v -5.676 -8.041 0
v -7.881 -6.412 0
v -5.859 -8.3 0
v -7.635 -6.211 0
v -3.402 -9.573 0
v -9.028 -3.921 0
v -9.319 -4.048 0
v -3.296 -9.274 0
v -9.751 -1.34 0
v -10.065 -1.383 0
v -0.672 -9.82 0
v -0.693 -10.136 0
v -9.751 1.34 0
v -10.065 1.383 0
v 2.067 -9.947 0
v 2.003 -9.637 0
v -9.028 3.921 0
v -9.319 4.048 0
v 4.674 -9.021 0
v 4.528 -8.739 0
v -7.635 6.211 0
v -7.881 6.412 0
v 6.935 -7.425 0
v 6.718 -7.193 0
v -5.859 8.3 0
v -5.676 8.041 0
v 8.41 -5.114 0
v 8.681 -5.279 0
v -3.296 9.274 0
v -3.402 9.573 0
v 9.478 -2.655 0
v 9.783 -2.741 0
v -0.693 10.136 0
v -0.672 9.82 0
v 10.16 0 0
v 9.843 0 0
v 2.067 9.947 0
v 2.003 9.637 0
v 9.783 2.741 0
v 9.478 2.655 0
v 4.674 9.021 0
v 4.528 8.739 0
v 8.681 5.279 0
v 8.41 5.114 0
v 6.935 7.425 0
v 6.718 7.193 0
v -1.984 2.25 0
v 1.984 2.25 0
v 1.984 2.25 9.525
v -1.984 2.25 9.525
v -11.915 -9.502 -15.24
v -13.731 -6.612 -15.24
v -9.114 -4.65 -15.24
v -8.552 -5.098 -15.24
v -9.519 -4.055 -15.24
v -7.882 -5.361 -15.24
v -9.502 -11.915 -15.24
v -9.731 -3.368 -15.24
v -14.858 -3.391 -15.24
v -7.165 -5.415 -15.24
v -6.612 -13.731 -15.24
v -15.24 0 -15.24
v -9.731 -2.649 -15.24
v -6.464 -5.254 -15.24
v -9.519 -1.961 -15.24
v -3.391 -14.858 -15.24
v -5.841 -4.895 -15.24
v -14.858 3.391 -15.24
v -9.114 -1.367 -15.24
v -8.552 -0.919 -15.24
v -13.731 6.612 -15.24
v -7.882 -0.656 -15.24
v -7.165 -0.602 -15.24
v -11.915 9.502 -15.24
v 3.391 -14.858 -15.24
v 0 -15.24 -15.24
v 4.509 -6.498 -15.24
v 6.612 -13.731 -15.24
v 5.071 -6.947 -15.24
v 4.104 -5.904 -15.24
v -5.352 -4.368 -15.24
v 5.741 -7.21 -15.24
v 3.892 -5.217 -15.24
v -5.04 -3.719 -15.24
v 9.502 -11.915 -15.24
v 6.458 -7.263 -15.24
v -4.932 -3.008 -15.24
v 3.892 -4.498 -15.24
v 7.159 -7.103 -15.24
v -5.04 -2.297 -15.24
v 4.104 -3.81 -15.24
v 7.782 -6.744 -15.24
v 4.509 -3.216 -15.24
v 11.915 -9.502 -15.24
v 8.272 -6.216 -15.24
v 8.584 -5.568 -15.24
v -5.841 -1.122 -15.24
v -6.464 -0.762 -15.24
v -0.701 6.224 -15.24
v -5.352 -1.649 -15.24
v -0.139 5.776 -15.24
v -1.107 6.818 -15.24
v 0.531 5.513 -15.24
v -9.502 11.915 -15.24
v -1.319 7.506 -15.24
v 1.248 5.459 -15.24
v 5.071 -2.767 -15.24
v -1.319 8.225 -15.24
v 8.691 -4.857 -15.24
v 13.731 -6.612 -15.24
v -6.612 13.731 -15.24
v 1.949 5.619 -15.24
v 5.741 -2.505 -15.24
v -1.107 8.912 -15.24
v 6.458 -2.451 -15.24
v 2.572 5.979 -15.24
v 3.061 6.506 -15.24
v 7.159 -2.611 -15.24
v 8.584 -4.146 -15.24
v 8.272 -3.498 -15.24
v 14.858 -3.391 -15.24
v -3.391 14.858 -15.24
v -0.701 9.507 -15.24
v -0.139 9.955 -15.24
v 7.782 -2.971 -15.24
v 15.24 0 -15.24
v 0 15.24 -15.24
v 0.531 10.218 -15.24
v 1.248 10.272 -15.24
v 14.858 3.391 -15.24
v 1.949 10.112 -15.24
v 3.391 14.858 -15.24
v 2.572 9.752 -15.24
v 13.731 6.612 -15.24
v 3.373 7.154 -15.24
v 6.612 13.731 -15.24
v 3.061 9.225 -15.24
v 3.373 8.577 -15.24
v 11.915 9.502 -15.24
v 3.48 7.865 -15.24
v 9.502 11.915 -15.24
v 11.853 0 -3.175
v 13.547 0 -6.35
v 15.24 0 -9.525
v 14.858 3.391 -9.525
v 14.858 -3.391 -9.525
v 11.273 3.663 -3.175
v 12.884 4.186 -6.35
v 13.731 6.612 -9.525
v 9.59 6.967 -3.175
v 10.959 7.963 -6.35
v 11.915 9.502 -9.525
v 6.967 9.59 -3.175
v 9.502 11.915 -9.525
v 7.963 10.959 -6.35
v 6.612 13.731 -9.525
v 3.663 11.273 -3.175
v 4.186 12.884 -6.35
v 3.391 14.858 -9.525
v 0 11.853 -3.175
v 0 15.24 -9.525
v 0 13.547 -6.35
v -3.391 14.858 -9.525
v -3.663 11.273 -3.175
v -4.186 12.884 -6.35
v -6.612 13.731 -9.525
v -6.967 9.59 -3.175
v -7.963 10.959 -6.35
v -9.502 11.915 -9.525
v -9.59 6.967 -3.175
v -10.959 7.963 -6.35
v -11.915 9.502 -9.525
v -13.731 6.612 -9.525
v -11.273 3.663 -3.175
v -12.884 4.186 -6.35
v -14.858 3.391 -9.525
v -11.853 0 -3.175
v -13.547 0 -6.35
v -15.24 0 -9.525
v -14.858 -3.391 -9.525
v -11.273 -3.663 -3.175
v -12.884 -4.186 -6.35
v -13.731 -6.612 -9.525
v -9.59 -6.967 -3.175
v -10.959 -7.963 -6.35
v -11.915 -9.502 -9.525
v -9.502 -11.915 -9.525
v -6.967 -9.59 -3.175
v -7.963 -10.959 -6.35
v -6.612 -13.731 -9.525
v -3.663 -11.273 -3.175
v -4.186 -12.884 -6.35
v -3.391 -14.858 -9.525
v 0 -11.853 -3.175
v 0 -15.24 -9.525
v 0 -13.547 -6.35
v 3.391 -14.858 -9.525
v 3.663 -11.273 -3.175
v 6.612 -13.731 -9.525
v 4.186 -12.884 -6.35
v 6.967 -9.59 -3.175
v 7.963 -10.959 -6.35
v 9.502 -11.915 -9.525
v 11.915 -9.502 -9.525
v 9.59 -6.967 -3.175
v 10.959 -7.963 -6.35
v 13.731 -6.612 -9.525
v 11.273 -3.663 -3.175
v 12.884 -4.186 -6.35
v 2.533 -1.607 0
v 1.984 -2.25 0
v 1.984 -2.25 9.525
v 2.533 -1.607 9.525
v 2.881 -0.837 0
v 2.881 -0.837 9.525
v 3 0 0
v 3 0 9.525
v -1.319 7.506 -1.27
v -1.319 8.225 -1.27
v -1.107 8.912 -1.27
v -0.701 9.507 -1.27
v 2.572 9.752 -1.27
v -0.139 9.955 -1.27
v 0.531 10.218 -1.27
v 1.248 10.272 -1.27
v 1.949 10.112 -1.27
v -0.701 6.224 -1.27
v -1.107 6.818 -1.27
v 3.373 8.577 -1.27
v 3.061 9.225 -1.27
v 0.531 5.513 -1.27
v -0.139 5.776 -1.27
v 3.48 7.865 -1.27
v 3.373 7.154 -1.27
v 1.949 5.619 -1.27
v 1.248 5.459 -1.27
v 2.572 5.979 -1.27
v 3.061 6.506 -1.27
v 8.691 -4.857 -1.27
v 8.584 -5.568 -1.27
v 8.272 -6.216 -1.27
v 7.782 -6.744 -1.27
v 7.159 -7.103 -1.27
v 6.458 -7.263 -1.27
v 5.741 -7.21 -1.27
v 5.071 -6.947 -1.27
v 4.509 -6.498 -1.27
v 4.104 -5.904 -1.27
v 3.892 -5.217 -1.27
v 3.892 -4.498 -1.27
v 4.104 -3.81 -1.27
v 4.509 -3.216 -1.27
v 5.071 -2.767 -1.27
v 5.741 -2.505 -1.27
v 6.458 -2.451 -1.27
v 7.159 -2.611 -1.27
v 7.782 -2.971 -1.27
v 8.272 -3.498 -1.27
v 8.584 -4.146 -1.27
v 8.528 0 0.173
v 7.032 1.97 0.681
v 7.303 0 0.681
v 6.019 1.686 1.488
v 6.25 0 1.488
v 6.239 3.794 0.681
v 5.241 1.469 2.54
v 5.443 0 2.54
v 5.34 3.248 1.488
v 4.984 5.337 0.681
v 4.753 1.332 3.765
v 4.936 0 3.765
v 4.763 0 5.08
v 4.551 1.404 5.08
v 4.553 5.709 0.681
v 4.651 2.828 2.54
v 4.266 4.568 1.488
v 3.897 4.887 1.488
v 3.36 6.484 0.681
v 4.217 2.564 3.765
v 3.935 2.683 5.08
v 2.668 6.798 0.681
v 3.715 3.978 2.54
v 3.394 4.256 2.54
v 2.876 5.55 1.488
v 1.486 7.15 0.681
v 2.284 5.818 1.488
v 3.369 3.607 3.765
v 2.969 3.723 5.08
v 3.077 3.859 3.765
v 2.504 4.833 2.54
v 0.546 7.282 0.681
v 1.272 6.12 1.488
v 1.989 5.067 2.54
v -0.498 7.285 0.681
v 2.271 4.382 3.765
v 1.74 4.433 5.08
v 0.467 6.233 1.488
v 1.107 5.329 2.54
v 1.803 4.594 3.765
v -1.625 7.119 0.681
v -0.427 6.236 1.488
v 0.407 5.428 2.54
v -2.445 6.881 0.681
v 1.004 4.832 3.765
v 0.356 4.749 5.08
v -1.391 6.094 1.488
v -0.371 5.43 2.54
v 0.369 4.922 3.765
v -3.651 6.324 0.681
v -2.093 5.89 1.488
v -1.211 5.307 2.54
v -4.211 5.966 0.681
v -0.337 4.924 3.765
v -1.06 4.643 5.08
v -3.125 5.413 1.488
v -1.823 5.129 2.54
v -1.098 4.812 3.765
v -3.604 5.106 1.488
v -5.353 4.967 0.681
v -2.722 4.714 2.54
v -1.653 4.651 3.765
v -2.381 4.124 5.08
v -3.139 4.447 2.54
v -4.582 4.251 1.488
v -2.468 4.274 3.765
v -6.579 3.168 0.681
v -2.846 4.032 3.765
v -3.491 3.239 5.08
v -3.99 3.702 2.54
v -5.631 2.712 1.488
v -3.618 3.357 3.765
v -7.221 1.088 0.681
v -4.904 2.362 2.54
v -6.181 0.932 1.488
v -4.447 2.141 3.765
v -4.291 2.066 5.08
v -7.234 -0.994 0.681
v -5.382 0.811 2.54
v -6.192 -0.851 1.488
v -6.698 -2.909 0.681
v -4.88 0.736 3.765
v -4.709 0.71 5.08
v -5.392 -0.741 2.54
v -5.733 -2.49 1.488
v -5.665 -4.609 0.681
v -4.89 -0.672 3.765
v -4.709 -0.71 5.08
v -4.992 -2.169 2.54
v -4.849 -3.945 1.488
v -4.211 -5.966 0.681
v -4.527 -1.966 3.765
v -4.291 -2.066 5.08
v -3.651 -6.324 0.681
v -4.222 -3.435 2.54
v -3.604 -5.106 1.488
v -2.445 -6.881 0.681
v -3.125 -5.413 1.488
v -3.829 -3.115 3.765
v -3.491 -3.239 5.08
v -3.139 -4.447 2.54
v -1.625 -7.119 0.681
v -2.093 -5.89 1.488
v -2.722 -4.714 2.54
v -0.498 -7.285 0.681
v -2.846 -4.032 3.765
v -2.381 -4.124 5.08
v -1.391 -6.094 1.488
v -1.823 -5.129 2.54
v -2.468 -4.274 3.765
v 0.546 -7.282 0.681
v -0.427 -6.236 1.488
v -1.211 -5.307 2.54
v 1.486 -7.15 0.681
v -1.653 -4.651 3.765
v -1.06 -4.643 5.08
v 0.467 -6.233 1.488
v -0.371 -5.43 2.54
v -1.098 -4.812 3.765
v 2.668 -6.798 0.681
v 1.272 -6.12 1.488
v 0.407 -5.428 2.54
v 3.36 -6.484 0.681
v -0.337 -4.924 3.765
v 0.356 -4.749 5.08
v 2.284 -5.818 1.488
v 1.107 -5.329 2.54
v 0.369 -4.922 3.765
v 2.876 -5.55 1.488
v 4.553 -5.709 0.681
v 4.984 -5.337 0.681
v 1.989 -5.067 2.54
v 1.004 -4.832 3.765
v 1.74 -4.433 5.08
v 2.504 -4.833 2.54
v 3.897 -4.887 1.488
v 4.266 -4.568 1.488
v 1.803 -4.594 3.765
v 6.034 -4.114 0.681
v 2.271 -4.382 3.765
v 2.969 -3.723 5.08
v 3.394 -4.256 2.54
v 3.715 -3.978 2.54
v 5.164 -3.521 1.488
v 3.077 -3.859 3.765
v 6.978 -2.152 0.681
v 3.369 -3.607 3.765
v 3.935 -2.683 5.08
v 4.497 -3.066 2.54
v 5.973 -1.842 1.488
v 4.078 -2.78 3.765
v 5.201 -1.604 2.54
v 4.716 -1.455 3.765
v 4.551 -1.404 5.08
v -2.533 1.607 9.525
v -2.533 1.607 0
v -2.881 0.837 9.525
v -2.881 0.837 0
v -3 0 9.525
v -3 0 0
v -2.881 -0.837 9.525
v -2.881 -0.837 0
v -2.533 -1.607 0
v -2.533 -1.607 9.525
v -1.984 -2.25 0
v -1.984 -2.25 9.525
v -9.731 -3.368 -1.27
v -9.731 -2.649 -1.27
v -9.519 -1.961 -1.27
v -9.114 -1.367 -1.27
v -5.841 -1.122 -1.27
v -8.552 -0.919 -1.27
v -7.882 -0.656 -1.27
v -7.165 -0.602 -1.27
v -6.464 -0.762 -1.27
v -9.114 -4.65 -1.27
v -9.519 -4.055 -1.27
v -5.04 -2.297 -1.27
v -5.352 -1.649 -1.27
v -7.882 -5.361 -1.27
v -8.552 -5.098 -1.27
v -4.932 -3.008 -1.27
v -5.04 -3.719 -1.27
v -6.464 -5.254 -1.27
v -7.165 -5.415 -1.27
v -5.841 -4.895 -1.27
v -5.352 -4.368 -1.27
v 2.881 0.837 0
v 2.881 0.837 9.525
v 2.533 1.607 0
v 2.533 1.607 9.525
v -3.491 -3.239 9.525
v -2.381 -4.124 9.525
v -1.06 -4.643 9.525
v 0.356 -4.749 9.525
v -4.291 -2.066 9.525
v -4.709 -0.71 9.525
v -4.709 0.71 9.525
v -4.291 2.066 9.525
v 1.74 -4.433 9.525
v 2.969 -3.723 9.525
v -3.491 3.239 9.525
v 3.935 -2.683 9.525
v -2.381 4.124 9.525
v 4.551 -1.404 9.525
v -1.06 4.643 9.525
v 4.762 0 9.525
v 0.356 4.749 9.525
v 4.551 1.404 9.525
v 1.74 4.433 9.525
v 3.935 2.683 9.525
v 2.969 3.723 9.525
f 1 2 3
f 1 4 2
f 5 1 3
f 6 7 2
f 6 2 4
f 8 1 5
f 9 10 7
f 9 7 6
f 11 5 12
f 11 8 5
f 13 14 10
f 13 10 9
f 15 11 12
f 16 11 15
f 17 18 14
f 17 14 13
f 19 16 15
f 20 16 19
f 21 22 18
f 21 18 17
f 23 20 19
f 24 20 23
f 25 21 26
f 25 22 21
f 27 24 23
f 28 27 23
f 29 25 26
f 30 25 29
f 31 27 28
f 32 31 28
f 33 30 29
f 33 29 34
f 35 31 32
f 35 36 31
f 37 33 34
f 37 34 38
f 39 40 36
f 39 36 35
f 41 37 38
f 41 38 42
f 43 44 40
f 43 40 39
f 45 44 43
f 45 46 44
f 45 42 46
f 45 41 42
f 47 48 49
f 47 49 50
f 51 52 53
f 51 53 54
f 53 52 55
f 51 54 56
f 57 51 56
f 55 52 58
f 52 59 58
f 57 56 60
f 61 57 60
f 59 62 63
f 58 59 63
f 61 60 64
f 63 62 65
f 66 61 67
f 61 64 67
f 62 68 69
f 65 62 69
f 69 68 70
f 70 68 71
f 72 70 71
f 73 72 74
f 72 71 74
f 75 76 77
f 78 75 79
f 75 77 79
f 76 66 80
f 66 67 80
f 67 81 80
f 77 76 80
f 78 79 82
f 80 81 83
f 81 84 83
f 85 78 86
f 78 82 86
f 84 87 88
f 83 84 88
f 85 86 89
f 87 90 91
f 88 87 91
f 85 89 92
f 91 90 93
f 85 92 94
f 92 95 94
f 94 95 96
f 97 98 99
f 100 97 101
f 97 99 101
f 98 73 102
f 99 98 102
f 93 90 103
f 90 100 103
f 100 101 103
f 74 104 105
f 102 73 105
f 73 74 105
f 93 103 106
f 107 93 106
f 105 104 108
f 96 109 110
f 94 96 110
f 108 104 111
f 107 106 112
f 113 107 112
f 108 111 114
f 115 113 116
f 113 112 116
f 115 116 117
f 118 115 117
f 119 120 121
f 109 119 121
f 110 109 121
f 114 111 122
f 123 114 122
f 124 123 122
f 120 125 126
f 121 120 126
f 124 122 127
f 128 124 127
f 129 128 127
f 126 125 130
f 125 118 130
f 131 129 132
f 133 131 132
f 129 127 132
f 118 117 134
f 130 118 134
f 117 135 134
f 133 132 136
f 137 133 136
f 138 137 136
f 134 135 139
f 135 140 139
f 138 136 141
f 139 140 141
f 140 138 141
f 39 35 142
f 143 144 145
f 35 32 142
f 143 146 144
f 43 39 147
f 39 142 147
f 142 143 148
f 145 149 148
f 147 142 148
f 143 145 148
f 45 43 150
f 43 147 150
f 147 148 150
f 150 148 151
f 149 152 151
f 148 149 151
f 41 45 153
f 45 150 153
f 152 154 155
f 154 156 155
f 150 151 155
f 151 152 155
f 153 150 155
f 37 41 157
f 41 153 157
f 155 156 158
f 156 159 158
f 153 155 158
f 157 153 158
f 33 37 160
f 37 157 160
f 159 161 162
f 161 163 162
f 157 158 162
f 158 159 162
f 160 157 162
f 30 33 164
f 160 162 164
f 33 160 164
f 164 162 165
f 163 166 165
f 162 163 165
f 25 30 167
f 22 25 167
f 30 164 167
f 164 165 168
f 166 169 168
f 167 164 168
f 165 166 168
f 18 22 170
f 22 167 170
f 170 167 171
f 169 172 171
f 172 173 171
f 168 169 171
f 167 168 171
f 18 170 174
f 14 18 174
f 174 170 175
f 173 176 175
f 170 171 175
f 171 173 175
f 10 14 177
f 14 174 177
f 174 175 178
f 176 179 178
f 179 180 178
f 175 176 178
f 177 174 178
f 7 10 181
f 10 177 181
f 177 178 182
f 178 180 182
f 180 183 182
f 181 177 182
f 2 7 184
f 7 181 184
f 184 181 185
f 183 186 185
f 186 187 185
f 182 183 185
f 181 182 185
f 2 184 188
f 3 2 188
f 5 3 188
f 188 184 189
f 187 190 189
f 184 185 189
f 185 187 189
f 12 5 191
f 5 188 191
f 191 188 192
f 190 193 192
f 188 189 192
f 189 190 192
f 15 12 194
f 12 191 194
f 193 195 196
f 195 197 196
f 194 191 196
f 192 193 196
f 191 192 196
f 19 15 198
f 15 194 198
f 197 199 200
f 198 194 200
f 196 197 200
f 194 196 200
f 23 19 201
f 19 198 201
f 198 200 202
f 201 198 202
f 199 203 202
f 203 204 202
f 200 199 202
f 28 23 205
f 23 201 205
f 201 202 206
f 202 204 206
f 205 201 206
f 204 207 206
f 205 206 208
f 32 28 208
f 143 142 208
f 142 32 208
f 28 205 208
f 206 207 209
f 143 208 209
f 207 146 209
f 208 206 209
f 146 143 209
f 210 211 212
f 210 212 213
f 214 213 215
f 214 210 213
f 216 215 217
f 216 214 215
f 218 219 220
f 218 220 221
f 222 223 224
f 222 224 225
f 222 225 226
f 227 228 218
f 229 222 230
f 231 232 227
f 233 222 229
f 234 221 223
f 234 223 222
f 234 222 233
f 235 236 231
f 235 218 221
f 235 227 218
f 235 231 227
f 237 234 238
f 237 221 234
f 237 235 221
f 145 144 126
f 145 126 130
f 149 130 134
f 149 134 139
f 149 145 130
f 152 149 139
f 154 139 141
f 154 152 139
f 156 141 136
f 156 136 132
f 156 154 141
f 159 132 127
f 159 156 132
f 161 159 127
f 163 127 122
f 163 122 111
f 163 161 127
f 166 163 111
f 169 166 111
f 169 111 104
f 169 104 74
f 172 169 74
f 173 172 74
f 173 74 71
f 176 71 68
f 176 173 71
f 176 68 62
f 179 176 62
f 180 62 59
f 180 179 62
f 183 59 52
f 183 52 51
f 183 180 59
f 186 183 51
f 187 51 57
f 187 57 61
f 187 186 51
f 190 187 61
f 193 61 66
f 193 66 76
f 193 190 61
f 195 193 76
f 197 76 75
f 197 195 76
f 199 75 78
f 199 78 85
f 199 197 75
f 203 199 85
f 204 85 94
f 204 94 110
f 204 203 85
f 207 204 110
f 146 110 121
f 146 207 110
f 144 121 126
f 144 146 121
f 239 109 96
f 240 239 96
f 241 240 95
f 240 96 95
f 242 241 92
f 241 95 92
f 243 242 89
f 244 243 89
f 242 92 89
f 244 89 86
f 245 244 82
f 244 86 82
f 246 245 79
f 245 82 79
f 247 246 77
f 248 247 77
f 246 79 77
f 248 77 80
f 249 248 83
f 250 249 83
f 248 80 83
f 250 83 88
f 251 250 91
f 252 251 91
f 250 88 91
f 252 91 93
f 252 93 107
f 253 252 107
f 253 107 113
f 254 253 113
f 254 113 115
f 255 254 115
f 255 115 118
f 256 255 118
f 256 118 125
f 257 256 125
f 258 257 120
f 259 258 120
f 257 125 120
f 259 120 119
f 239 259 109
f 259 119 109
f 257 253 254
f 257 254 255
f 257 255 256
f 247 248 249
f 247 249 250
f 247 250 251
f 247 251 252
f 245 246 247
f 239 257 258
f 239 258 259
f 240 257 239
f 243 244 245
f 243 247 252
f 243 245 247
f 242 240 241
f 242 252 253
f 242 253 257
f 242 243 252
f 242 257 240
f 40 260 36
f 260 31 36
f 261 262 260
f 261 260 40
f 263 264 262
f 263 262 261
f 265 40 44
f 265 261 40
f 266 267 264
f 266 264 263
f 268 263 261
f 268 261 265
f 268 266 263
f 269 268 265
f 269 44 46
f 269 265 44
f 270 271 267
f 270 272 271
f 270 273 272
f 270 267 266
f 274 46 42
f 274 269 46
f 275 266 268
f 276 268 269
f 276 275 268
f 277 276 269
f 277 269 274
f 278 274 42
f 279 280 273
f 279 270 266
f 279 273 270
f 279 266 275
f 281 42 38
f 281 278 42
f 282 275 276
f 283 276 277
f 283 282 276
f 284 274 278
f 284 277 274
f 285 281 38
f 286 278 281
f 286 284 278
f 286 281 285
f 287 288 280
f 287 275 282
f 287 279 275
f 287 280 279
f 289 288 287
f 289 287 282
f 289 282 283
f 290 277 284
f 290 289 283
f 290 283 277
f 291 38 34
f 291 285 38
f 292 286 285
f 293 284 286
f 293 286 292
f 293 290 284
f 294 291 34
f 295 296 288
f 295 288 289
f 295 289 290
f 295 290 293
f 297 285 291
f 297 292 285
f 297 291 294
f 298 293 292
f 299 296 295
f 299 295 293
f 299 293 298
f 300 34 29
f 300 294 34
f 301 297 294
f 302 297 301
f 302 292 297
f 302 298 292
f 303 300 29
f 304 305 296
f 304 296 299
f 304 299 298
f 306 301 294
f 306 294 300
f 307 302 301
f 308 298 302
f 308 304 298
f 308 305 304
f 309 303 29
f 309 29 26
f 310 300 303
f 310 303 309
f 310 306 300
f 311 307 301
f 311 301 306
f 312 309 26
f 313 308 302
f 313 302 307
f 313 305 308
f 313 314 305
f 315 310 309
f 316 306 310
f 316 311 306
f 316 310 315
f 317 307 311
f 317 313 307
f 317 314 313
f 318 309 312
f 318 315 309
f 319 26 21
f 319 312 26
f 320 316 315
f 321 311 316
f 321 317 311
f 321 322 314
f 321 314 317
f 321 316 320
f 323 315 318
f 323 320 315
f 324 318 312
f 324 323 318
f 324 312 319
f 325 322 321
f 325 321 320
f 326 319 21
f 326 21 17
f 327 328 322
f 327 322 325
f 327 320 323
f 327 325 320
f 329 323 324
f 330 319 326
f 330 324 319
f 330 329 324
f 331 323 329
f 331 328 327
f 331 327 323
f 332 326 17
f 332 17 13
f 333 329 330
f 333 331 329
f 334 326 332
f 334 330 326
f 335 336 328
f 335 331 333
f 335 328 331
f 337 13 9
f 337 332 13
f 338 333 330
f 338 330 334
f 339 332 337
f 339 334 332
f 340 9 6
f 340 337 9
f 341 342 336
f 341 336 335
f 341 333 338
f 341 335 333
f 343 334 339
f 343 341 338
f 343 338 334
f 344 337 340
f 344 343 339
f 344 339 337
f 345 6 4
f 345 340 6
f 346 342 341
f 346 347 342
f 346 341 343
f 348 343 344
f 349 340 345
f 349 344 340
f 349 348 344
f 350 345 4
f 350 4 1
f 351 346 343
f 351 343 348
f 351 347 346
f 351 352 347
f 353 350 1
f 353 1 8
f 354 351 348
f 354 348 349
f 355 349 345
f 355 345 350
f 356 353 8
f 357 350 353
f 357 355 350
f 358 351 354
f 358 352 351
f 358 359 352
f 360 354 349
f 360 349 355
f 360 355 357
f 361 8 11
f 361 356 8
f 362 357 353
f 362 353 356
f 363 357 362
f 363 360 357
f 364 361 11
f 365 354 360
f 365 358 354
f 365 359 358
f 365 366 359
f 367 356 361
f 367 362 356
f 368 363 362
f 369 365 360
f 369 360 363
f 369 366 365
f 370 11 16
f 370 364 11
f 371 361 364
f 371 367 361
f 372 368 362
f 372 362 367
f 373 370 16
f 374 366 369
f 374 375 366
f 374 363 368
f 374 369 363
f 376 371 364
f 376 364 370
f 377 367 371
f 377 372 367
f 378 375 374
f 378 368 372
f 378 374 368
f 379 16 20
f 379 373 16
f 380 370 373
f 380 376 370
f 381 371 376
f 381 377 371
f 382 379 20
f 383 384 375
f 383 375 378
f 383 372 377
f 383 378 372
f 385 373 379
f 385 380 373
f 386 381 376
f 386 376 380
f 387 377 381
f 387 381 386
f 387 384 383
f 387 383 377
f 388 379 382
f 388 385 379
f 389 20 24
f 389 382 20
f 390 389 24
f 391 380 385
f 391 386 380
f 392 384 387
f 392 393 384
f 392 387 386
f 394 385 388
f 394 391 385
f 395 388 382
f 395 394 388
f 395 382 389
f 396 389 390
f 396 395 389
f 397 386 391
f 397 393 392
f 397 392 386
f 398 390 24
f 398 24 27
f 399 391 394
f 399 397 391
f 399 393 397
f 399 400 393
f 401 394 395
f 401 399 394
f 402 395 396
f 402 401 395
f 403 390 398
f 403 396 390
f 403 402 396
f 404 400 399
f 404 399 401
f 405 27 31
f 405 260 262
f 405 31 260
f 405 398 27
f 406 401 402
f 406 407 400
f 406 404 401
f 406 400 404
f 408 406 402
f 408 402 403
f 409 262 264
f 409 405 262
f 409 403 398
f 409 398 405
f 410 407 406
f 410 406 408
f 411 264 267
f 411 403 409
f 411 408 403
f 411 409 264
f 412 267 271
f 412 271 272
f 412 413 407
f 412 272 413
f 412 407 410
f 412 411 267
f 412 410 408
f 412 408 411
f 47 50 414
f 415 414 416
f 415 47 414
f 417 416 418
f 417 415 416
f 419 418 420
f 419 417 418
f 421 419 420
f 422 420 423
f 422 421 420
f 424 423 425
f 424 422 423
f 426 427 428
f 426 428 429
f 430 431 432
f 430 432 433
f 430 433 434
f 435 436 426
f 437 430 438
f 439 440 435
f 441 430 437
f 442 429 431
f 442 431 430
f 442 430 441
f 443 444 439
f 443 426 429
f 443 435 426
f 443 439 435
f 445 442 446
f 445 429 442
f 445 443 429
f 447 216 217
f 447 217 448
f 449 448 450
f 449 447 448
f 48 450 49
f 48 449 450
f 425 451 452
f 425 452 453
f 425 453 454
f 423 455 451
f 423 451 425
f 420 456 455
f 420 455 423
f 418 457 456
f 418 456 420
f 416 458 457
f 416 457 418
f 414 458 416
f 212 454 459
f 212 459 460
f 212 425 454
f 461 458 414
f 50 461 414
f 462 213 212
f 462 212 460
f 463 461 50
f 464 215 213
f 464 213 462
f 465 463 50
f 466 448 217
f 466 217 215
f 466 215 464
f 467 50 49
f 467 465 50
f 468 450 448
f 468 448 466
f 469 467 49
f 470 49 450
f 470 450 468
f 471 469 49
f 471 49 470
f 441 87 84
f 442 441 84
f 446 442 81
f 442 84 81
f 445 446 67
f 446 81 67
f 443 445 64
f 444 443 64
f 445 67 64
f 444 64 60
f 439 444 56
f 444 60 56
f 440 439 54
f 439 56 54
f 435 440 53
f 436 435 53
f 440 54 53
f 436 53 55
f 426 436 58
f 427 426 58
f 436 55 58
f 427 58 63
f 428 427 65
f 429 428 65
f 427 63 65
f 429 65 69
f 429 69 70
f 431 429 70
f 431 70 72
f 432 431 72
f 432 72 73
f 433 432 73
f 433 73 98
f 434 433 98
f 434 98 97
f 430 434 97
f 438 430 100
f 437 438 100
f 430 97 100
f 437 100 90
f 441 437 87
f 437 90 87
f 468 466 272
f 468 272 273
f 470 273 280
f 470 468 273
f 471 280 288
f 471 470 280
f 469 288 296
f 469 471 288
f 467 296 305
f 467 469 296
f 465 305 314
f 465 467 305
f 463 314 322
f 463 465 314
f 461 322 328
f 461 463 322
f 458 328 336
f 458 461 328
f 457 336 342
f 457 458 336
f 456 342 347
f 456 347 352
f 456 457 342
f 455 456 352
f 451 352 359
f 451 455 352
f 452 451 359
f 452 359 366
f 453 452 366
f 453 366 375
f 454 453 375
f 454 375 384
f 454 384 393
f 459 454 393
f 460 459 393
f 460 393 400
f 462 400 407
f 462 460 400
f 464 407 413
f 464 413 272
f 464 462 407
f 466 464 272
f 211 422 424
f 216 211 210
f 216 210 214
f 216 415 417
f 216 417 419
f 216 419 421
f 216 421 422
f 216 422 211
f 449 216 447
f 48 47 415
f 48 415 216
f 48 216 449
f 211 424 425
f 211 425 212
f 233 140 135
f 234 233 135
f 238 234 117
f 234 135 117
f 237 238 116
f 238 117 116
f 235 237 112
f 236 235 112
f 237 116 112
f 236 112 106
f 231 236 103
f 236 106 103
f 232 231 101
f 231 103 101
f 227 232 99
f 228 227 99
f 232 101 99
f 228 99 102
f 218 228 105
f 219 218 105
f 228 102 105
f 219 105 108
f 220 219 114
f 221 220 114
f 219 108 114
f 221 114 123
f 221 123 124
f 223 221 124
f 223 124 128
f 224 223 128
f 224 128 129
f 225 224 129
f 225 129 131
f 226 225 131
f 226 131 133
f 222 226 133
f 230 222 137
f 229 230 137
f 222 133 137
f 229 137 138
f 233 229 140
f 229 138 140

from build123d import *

# Parameters (mm, degrees)
F0_R          = 4.7625
F1_DEPTH      = 9.525
F1_DEPTH_BACK = 6.35
F3_DEPTH      = 9.526
F4_R          = 15.24
F5_DEPTH      = 15.24
F6_R          = 2.413
F7_DEPTH      = 13.97
F8_SIZE2      = 9.525
F8_SIZE       = 5.08
F9_R          = 5.08


with BuildPart() as f1:
    # F0 (on Top) → F1 (new body, two sides)
    with BuildSketch(Plane.XY) as f1_sk:
        Circle(F0_R)
    extrude(amount=F1_DEPTH)
    extrude(f1_sk.sketch, amount=-F1_DEPTH_BACK)

    # F2 (on Top) → F3 (cut, through all)
    with BuildSketch(Plane.XY):
        with BuildLine():
            ThreePointArc((1.9843134833, -2.25), (2.7343134833, -1.2343134833), (3, 0))
            ThreePointArc((3, 0), (2.7343134833, 1.2343134833), (1.9843134833, 2.25))
            Line((1.9843134833, 2.25), (-1.9843134833, 2.25))
            ThreePointArc((-1.9843134833, 2.25), (-3, 0), (-1.9843134833, -2.25))
            Line((-1.9843134833, -2.25), (1.9843134833, -2.25))
        make_face()
    extrude(amount=F3_DEPTH, mode=Mode.SUBTRACT)

    # F4 (on Top) → F5 (join)
    with BuildSketch(Plane.XY):
        Circle(F4_R)
    extrude(amount=-F5_DEPTH)

    # F6 (on face) → F7 (cut)
    with BuildSketch(Plane(origin=(0, 0, -15.24), x_dir=(1, 0, 0), z_dir=(0, 0, -1))):
        with Locations((1.0674559099, -7.8653953575)):
            Circle(F6_R)
        with Locations((6.2779042355, 4.8571416142)):
            Circle(F6_R)
        with Locations((-7.3453601454, 3.0082537434)):
            Circle(F6_R)
    extrude(amount=-F7_DEPTH, mode=Mode.SUBTRACT)

    # F8
    f8_edges = [f1.edges().sort_by_distance(p)[0] for p in [
        (-15.24, 0, 0),
    ]]
    f8_side = f1.faces().sort_by_distance((-14.808948, 0, 0))[0]
    chamfer(f8_edges, length=F8_SIZE, length2=F8_SIZE2, reference=f8_side)

    # F9
    f9_edges = [f1.edges().sort_by_distance(p)[0] for p in [
        (-4.7625, 0, 0),
    ]]
    fillet(f9_edges, radius=F9_R)


solid = f1.part
